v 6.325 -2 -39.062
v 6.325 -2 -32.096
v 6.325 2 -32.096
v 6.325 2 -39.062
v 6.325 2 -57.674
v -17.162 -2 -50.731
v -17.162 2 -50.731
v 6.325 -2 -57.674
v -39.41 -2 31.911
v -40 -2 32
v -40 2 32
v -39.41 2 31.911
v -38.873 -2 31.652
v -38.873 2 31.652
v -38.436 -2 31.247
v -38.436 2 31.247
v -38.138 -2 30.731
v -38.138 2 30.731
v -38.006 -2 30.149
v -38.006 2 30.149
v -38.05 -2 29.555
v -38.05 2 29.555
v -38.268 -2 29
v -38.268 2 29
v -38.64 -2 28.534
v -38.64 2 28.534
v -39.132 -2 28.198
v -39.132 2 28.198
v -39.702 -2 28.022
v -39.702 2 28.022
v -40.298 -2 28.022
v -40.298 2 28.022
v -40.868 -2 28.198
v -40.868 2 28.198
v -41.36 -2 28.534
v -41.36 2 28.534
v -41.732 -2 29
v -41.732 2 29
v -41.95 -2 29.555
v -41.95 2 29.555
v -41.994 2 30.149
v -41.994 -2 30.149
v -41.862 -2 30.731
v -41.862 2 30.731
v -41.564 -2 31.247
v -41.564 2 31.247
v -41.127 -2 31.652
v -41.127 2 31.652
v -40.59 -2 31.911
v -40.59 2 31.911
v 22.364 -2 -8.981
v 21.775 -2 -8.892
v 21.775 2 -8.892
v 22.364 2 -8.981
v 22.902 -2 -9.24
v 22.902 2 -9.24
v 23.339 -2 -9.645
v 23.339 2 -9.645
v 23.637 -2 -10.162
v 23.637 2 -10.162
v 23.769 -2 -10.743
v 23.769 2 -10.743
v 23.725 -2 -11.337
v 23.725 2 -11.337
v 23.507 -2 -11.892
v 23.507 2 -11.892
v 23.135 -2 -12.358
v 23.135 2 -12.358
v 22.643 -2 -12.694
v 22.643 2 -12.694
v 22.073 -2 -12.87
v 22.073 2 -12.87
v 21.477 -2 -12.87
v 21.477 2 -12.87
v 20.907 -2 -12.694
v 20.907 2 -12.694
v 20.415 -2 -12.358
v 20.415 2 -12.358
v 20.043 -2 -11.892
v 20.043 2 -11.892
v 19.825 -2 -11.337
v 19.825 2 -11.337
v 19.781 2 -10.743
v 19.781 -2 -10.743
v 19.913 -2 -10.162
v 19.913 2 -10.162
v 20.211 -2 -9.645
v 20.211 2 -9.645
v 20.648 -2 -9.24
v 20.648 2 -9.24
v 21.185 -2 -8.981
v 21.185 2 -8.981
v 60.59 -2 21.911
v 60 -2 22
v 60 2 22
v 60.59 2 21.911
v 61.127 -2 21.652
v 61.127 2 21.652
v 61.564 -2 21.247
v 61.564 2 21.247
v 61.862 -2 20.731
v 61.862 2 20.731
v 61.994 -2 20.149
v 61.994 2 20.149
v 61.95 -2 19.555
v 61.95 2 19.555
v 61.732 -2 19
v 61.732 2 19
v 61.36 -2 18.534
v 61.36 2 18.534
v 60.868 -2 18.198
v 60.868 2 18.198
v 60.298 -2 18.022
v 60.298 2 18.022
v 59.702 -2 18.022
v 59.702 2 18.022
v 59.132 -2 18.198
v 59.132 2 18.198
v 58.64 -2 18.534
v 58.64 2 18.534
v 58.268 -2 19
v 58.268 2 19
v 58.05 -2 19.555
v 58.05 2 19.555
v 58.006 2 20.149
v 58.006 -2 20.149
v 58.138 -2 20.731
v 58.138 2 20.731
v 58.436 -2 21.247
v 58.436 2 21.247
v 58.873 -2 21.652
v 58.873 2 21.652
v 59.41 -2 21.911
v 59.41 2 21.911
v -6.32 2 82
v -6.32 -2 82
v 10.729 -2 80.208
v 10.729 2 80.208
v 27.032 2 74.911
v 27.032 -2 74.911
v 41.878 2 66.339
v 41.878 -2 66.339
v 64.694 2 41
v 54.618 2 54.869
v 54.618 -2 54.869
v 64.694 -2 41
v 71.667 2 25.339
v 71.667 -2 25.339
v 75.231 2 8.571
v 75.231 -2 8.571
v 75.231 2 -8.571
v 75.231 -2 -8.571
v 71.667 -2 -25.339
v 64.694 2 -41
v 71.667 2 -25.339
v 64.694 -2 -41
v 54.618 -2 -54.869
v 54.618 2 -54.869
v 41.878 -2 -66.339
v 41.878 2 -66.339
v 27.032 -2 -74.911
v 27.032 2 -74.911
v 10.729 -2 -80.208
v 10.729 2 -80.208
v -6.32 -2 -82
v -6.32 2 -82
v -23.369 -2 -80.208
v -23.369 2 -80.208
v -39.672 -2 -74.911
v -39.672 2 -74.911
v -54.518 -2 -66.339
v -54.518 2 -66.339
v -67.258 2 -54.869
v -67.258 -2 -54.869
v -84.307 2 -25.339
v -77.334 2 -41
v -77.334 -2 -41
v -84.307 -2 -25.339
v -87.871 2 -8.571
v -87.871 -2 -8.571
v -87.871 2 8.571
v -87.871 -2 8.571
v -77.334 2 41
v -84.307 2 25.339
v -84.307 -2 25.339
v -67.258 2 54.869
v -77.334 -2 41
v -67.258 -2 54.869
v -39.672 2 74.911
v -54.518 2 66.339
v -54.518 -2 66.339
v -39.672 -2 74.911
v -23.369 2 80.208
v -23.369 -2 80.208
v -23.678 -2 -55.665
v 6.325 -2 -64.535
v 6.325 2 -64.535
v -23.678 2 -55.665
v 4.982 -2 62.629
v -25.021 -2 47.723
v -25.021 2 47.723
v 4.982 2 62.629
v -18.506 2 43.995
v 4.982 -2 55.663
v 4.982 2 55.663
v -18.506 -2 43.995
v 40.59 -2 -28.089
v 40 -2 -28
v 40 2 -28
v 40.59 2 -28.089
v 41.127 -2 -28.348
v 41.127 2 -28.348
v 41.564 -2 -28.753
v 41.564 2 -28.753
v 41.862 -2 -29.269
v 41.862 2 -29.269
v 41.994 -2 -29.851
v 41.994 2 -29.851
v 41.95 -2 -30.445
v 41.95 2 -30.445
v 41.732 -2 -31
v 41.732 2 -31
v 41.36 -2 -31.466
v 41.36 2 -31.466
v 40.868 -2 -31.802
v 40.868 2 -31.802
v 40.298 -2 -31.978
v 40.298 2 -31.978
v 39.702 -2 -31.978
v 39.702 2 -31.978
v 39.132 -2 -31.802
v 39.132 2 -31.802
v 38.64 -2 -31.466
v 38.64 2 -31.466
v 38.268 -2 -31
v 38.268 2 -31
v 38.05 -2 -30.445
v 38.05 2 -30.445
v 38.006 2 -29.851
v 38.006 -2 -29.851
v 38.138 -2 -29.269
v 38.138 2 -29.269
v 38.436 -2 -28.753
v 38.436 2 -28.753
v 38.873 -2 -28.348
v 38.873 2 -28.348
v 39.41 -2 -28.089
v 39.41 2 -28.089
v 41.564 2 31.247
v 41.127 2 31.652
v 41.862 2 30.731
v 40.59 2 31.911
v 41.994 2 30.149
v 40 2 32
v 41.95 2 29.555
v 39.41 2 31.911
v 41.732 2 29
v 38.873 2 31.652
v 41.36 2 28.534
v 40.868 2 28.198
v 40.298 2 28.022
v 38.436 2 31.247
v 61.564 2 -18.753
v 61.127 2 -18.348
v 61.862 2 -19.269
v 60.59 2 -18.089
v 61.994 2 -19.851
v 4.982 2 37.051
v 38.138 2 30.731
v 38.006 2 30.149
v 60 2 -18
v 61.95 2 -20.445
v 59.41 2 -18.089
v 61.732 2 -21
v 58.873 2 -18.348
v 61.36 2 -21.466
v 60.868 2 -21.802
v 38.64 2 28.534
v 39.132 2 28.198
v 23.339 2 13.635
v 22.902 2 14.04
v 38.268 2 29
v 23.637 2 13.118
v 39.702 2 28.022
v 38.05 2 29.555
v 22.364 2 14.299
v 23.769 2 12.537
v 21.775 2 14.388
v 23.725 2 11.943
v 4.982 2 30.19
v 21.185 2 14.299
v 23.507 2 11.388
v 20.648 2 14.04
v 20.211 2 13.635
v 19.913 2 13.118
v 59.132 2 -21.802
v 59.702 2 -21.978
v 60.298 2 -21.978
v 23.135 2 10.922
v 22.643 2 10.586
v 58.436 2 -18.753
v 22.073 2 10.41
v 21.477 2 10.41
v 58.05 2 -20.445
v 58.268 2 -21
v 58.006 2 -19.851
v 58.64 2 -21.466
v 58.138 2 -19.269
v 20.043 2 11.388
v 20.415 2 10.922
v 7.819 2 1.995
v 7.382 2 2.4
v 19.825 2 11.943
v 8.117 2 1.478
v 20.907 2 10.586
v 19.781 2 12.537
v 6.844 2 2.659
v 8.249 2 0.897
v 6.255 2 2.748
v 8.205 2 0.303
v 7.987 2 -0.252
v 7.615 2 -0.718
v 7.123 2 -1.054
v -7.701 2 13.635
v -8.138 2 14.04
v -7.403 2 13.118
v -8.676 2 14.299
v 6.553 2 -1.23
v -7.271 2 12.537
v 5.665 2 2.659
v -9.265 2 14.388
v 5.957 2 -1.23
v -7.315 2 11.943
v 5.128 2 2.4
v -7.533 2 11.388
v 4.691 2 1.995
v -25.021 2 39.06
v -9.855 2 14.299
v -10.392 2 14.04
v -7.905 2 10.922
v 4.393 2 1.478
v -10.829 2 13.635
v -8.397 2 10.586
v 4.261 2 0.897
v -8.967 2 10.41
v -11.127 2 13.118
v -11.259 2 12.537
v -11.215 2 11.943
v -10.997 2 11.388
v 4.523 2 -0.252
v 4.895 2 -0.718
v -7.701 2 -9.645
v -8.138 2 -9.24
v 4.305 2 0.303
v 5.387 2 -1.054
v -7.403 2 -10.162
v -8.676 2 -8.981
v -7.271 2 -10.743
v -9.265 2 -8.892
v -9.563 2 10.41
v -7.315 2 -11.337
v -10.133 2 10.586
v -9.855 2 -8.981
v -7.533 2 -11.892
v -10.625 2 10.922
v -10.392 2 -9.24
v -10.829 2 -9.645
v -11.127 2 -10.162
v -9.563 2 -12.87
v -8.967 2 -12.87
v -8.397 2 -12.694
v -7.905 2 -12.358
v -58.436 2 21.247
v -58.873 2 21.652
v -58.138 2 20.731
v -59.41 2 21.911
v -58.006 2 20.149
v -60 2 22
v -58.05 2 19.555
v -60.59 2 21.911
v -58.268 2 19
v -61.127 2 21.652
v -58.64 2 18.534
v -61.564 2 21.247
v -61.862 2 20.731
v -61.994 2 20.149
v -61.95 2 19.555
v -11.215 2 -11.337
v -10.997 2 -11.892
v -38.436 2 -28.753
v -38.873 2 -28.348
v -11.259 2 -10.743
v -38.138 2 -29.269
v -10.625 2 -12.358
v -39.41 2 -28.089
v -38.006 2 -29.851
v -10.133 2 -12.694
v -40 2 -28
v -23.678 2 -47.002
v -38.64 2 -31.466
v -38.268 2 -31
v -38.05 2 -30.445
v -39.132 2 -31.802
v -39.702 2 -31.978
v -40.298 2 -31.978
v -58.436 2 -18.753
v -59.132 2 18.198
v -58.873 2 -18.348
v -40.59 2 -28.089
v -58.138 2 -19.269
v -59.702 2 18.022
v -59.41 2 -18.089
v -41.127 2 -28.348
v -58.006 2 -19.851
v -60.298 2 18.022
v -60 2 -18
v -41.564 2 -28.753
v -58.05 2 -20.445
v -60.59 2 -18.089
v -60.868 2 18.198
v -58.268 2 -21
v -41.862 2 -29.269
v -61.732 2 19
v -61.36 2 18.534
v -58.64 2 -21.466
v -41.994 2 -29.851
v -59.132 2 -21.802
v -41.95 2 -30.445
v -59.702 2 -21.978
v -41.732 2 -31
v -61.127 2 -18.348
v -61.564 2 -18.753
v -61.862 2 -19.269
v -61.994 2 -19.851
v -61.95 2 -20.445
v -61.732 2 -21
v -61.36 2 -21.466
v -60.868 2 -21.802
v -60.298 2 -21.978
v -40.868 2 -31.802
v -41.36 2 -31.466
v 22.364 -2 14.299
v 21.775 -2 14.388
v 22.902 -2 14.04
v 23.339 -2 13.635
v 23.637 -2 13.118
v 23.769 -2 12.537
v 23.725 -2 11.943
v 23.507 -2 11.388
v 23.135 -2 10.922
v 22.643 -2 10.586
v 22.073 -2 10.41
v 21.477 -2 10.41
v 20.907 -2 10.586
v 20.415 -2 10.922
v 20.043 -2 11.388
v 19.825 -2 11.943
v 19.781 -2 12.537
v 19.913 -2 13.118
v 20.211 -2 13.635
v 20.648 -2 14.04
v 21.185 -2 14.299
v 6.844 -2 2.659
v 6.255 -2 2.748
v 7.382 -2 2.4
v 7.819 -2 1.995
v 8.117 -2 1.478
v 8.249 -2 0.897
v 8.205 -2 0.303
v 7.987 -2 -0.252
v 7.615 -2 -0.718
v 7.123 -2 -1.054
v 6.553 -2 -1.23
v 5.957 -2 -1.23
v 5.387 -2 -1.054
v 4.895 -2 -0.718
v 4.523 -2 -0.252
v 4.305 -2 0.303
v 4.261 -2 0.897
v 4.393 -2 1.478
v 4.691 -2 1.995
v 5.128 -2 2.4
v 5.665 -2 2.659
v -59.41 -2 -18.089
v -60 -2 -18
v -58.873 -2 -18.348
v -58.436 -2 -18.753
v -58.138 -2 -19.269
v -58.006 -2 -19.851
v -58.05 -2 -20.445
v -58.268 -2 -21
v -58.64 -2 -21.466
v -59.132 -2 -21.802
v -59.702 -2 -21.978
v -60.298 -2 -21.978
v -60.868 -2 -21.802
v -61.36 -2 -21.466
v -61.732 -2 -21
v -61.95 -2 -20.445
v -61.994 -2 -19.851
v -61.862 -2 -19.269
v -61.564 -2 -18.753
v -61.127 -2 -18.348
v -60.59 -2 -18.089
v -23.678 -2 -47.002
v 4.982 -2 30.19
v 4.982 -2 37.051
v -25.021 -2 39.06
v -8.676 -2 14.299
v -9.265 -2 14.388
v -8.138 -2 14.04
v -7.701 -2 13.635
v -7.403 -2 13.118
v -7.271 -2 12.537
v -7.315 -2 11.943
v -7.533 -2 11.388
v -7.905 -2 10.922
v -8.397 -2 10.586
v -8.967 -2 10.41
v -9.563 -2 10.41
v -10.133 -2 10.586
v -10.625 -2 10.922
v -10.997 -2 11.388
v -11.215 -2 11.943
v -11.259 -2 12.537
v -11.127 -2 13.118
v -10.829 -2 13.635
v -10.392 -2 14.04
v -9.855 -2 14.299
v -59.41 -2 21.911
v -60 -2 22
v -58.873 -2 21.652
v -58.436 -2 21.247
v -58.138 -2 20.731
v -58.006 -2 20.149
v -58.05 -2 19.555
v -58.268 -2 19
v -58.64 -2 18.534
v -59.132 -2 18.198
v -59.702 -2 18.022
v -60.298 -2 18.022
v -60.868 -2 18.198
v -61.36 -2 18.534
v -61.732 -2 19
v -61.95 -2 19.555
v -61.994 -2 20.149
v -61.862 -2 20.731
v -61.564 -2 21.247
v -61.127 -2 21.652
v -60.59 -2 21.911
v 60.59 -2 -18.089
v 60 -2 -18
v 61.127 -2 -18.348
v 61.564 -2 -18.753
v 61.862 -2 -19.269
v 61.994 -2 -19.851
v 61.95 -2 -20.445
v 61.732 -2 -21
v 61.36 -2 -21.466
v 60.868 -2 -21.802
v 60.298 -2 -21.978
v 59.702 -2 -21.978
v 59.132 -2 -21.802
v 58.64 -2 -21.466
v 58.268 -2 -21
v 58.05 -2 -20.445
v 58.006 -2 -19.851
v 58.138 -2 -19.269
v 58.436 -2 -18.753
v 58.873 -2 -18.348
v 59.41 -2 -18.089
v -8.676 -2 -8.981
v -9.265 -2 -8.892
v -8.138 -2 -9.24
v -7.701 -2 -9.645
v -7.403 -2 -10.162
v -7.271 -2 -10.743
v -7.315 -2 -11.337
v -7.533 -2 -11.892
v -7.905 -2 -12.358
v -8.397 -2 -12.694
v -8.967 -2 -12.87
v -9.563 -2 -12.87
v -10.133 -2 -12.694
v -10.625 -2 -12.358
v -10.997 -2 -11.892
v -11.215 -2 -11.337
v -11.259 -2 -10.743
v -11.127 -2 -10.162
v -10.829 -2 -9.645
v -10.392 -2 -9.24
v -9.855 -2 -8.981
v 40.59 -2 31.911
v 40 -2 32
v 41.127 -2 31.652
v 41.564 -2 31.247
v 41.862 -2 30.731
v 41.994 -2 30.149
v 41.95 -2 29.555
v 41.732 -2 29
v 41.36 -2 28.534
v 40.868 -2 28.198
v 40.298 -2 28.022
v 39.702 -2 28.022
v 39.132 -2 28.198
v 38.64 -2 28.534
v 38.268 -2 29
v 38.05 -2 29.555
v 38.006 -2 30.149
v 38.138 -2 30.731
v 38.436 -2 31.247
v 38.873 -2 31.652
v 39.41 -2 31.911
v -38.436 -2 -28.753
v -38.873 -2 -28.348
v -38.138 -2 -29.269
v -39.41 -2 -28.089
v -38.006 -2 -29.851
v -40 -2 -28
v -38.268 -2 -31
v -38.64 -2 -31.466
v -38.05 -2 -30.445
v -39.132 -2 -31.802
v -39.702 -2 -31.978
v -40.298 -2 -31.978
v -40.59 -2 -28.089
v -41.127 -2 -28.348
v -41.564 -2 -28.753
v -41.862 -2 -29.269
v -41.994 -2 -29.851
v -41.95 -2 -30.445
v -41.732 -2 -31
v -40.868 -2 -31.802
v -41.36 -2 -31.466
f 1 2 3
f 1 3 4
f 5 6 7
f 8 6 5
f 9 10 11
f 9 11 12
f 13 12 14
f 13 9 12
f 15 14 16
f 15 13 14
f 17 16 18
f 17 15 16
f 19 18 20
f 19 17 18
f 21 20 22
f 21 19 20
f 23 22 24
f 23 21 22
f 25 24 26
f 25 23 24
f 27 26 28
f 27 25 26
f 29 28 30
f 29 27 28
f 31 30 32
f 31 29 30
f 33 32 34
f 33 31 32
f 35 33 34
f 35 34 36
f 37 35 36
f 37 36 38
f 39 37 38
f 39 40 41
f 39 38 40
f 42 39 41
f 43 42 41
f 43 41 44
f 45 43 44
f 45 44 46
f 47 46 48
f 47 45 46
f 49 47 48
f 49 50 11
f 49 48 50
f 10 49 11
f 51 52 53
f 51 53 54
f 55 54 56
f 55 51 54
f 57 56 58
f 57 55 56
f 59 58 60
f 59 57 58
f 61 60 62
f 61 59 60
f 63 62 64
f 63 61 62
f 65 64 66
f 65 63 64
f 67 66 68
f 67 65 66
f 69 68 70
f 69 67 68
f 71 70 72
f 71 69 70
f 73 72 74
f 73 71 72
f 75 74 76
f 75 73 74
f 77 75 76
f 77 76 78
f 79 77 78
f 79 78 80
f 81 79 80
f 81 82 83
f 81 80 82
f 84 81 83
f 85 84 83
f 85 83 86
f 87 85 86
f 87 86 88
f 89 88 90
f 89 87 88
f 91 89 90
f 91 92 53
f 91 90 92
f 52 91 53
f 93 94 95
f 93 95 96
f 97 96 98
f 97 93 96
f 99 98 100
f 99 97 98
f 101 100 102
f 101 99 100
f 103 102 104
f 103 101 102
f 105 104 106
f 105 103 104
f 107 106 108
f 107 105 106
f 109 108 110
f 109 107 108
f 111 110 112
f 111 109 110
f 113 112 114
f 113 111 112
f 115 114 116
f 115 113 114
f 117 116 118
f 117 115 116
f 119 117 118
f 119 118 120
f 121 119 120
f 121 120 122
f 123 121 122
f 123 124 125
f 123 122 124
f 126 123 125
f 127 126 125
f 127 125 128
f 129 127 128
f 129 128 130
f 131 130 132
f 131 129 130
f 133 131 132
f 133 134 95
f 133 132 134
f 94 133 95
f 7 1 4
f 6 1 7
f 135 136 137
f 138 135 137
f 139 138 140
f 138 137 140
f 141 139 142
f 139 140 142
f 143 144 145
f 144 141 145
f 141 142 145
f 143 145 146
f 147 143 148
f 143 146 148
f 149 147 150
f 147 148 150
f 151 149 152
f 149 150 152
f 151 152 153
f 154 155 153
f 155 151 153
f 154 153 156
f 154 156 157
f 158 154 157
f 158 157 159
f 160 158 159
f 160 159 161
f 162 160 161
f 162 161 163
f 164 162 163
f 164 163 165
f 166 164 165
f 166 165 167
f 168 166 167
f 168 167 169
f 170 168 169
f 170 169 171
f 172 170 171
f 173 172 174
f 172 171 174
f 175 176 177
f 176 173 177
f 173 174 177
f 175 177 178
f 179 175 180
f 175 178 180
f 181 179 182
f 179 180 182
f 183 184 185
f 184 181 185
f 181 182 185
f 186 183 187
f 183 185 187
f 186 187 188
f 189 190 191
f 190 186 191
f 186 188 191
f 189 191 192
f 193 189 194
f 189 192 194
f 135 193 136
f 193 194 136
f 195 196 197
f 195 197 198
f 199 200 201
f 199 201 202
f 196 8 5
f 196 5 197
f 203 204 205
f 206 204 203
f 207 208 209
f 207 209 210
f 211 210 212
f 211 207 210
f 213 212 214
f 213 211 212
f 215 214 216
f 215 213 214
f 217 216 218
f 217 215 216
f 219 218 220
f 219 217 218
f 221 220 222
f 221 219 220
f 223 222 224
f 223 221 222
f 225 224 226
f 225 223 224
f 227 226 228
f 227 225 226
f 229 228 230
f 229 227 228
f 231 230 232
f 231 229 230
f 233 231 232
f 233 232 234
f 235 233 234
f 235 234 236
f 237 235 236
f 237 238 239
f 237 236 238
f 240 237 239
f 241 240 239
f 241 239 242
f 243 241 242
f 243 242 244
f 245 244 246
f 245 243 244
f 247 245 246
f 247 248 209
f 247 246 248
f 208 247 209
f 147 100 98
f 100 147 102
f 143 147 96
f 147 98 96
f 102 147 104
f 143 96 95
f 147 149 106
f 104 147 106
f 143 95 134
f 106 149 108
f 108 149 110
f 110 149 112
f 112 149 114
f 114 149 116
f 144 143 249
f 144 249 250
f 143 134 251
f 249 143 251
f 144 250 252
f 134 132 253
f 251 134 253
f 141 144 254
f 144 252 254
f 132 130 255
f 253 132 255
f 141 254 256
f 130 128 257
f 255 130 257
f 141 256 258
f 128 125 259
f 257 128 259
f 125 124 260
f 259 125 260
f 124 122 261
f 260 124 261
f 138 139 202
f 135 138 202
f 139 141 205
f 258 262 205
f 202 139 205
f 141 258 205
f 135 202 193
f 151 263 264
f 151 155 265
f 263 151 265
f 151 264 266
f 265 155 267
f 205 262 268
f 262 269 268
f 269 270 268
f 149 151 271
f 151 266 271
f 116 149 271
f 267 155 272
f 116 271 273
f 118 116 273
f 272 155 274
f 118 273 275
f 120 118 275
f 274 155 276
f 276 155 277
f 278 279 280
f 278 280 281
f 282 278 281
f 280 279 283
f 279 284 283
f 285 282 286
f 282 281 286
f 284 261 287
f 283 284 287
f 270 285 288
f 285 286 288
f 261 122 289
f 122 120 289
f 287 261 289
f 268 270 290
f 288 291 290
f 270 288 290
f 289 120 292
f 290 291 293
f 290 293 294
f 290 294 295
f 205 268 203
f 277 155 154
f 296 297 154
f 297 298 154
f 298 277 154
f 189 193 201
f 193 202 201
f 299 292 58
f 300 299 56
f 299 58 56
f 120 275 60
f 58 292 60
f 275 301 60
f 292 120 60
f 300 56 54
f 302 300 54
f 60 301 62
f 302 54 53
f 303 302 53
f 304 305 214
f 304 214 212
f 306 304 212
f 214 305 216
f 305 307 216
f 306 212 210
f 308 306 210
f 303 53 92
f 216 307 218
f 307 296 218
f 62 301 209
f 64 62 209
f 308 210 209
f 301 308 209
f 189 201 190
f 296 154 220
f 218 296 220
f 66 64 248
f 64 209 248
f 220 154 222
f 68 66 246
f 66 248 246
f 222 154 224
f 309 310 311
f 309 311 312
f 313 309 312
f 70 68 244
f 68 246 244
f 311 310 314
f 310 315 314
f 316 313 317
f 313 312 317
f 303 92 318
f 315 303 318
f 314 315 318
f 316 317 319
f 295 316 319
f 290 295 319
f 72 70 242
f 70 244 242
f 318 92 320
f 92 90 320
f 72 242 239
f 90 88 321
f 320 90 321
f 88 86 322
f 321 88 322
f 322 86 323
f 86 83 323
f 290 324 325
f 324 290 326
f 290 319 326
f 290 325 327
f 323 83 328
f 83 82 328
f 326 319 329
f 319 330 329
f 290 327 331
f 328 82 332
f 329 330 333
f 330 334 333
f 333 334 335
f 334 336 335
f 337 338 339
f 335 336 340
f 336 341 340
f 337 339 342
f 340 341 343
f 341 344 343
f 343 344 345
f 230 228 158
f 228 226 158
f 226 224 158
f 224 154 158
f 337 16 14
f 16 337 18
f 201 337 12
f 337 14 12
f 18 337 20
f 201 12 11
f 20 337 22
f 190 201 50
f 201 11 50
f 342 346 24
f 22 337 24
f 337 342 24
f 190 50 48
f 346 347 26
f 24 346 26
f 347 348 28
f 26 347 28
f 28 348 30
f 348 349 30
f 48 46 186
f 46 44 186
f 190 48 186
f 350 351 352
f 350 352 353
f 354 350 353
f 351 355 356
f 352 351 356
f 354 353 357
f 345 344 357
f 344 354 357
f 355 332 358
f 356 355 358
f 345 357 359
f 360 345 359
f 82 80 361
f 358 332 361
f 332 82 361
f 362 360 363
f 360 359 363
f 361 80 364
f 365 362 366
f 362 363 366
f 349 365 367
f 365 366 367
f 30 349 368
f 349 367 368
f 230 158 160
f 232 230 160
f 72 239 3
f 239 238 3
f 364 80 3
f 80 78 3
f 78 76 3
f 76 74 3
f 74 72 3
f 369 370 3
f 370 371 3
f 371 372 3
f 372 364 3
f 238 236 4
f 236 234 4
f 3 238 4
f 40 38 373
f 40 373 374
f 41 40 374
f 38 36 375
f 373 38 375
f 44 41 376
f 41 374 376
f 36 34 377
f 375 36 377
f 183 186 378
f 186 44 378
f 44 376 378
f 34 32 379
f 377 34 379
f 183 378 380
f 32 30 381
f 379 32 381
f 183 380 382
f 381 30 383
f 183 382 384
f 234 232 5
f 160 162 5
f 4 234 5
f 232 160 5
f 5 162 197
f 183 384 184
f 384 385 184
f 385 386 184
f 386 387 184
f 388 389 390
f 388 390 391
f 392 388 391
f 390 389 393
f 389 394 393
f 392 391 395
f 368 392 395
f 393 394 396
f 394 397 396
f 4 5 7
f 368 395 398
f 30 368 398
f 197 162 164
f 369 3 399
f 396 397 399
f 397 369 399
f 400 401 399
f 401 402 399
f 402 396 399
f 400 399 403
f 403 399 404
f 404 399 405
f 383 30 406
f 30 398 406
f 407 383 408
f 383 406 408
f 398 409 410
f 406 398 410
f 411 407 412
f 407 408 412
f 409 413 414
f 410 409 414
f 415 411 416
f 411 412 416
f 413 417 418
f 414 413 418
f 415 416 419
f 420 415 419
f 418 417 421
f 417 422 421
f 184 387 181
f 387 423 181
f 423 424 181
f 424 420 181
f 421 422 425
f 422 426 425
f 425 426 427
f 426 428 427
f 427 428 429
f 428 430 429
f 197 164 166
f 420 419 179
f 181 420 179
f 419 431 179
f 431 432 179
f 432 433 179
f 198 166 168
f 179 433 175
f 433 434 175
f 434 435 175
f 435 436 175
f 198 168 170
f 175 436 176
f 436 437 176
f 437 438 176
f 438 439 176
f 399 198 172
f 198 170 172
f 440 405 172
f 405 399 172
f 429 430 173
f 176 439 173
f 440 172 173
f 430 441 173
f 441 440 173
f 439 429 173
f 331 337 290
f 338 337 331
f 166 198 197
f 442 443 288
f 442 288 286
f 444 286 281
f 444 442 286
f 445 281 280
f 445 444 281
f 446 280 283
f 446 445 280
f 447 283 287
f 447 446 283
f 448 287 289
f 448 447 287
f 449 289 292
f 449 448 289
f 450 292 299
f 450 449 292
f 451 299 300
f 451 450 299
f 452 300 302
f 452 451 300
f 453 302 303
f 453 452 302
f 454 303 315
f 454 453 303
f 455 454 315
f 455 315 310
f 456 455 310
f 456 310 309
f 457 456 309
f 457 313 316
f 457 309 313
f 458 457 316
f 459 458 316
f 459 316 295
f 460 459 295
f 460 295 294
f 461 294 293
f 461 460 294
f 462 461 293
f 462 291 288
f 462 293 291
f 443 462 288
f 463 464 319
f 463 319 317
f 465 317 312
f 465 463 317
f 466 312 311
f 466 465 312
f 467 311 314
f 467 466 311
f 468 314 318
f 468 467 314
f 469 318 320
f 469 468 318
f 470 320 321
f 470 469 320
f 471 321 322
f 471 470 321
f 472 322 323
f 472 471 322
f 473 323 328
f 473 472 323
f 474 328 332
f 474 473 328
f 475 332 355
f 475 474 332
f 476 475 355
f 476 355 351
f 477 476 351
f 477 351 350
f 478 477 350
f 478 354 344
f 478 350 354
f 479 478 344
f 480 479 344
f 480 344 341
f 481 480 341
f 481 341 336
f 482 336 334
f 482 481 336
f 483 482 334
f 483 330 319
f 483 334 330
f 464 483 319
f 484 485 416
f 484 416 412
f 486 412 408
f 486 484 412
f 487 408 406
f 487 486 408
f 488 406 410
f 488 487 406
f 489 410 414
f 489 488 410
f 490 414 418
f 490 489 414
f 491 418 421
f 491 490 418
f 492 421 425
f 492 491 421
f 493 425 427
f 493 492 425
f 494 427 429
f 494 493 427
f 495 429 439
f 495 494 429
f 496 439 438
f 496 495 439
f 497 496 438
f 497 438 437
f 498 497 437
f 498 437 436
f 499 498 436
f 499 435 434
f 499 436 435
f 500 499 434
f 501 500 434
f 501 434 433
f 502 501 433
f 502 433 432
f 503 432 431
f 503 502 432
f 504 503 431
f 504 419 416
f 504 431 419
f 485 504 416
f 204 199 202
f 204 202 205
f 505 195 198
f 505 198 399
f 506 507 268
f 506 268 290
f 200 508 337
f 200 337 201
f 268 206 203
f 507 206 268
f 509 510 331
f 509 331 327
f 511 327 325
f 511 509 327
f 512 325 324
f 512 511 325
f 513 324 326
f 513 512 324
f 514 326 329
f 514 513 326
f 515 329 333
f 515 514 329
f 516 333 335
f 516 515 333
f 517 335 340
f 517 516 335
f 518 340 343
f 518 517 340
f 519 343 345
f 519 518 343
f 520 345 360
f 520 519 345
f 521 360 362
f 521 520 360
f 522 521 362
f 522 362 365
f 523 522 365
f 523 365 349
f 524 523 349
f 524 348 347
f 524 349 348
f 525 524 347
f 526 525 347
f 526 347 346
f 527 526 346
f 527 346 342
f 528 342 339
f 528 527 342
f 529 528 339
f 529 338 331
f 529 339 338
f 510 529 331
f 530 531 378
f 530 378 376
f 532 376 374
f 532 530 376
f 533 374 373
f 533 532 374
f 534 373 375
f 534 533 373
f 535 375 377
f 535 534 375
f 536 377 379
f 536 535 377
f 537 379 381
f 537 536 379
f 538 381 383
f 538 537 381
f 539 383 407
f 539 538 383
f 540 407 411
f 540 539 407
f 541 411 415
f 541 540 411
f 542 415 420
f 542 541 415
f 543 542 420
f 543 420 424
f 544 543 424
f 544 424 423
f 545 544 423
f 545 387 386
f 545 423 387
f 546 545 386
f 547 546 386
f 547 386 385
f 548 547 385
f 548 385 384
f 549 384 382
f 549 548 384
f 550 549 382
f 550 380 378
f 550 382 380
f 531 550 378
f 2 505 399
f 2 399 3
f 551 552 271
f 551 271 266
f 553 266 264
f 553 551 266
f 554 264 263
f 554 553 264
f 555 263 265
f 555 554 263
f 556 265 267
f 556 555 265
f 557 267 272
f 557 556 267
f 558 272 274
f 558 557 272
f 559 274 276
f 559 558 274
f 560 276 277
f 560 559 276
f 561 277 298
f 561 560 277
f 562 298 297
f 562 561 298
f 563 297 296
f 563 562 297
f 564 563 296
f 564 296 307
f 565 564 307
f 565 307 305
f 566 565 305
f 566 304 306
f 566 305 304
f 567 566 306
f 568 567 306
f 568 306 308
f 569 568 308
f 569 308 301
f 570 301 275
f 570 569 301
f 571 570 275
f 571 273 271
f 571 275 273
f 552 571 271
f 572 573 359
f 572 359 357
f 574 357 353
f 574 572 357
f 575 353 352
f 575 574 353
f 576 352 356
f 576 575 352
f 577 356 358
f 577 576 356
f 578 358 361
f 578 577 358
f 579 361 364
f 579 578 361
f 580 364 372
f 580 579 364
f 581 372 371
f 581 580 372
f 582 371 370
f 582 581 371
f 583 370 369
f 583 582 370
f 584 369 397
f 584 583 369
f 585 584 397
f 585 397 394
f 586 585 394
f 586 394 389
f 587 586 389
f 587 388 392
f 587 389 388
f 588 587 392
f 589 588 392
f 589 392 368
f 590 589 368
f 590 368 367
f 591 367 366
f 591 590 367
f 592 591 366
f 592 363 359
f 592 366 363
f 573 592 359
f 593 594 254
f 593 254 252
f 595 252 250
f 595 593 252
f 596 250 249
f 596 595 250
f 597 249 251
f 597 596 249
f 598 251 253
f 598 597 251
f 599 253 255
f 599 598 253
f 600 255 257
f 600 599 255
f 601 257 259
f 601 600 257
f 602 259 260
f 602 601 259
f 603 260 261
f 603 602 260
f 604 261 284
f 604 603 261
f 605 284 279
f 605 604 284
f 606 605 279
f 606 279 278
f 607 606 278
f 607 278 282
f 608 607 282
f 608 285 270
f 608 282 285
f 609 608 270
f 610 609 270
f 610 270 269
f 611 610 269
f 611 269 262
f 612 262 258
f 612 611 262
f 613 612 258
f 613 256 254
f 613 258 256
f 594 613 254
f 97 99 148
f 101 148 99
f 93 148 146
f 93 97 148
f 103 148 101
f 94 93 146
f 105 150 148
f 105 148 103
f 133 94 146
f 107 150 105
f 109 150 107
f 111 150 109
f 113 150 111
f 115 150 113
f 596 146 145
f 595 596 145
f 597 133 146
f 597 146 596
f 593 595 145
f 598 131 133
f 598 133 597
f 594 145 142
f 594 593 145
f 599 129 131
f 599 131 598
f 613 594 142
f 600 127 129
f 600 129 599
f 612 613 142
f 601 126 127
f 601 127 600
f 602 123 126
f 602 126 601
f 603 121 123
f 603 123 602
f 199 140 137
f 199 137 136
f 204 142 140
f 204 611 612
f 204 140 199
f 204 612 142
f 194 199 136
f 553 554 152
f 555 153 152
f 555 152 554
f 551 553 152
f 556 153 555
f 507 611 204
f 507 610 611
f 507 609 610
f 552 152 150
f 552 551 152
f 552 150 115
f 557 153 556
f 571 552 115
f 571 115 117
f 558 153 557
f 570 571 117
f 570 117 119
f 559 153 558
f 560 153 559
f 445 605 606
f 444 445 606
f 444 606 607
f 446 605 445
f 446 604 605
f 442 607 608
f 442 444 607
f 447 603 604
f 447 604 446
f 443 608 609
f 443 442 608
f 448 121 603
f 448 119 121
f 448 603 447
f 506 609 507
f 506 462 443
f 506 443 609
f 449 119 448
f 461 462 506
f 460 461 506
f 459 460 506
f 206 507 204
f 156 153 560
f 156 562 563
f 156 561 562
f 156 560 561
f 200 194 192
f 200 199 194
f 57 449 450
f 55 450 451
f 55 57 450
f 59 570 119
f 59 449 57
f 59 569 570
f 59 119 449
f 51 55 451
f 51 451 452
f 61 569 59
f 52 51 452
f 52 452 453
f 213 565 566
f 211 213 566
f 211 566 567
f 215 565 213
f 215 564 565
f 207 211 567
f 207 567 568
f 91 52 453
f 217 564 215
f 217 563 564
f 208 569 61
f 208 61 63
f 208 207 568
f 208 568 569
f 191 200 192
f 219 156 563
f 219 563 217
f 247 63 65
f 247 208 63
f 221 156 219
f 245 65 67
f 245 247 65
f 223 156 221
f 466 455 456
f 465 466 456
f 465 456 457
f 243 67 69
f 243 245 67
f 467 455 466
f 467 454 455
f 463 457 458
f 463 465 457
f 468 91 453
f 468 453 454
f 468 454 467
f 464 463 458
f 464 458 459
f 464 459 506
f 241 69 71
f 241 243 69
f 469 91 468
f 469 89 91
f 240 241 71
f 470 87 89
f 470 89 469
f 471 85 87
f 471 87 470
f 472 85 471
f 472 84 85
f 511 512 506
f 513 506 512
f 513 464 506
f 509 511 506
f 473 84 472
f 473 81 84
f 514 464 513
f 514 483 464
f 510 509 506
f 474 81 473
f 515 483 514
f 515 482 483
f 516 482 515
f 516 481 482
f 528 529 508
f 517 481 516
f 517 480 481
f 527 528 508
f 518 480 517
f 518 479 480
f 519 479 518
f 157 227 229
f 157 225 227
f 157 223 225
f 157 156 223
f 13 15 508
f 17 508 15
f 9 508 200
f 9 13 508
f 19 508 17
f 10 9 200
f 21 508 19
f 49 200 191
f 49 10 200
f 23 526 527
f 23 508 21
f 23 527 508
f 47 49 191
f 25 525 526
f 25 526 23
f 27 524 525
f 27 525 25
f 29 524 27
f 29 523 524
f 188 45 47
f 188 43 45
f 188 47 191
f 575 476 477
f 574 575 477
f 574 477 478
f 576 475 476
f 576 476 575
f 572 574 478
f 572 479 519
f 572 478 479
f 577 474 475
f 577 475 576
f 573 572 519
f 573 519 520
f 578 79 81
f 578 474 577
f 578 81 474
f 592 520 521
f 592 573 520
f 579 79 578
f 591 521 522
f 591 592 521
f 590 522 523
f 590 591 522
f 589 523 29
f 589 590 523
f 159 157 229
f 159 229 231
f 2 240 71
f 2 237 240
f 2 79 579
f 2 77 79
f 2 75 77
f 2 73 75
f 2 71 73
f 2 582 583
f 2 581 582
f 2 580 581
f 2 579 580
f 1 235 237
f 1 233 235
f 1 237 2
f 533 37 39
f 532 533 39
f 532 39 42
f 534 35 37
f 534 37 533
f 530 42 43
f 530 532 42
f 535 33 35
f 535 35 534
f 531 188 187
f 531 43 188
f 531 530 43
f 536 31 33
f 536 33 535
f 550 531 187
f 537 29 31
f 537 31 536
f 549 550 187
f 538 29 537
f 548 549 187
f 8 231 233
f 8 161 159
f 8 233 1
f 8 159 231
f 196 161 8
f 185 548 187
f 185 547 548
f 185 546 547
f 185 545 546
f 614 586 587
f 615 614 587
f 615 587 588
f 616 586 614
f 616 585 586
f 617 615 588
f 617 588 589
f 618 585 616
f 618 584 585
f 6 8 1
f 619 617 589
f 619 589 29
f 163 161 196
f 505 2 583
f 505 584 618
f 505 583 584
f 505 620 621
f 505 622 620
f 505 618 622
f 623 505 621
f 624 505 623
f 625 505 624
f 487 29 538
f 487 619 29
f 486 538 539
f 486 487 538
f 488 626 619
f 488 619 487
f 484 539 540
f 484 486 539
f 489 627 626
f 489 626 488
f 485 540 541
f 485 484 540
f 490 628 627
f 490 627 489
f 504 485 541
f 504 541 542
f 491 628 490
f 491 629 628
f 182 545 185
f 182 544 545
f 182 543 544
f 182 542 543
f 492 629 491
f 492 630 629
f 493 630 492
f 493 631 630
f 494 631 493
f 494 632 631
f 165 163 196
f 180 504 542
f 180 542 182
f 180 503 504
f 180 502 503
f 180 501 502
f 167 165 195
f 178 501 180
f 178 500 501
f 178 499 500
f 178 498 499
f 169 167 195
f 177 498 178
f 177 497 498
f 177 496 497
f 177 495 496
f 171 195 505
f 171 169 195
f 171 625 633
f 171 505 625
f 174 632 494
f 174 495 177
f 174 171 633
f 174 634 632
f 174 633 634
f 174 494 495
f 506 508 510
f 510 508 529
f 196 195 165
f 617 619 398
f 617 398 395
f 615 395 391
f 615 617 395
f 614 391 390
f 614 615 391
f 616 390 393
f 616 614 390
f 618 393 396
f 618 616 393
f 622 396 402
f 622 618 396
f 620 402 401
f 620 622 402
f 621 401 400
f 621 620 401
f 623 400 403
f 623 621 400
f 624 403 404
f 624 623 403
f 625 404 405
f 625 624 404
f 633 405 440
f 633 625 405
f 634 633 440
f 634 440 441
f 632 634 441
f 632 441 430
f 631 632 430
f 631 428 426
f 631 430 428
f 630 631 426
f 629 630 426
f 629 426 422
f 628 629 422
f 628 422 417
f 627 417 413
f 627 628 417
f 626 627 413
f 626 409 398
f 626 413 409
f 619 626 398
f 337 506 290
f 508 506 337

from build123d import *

# Parameters (mm, degrees)
EXTRUDE_2426_DEPTH          = 2
CUT_EXTRUDE_2700_DEPTH      = 184.109257002
CUT_EXTRUDE_2700_DEPTH_BACK = 184.109257002
SKETCH_5_R                  = 92
SKETCH_5_R_2                = 82
VV_DEPTH                    = 121.533854246
VV_DEPTH_BACK               = 121.533854246
CUT_EXTRUDE_7_DEPTH         = 121.533854246
CUT_EXTRUDE_7_DEPTH_BACK    = 121.533854246
SKETCH_10_R                 = 2
CUT_EXTRUDE_8_DEPTH         = 121.533854246
CUT_EXTRUDE_8_DEPTH_BACK    = 121.533854246
SKETCH_17_R                 = 2
CUT_EXTRUDE_9_DEPTH         = 121.533854246
CUT_EXTRUDE_9_DEPTH_BACK    = 121.533854246
SKETCH_6_R                  = 2


with BuildPart() as part:
    # 草图1 → Extrude 2426 (new, symmetric)
    with BuildSketch(Plane(origin=(0, 0, 0), x_dir=(1, 0, 0), z_dir=(0, 1, 0))):
        Polygon((-150, -85), (-150, 85), (-110, 85), (-69, 85), (-62, 85), (-25, 105), (-2, 105), (30, 105), (56.423376881, 85), (67.423376881, 85), (108.643784617, 85), (108.643784617, 70), (123.423376881, 70), (138, 40), (150, 40), (150, -40), (138, -40), (123.423376881, -70), (108.643784617, -70), (108.643784617, -85), (67.423376881, -85), (56.423376881, -85), (30, -105), (-2, -105), (-25, -105), (-62, -85), (-69, -85), (-110, -85), align=None)
    extrude(amount=EXTRUDE_2426_DEPTH, both=True)

    # 草图5 → Cut-Extrude 2700 (cut, two sides: drawn at the far end of the back side and taken through both)
    with BuildSketch(Plane(origin=(0, 0, 0), x_dir=(1, 0, 0), z_dir=(0, 1, 0)).offset(-CUT_EXTRUDE_2700_DEPTH_BACK)):
        with Locations((-6.31992991, 0)):
            Circle(SKETCH_5_R)
        with Locations(Location((-6.31992991, 0, 0), (0, 0, 270))):
            Circle(SKETCH_5_R_2, mode=Mode.SUBTRACT)
    extrude(amount=CUT_EXTRUDE_2700_DEPTH + CUT_EXTRUDE_2700_DEPTH_BACK, mode=Mode.SUBTRACT)


with BuildPart() as body_2:
    # of the pieces the cut leaves, the one that is kept (cut_extrude_2700_keep)
    add(part.part.solids().sort_by_distance((-6.31992991, -2, 82))[0])

    # 草图11 → vv (cut, two sides: drawn at the far end of the back side and taken through both)
    with BuildSketch(Plane(origin=(0, 0, 0), x_dir=(1, 0, 0), z_dir=(0, 1, 0)).offset(-VV_DEPTH_BACK)):
        Polygon((6.325153319, 64.535132696), (-23.677770795, 55.665092595), (-23.677770795, 47.002272942), (6.325153319, 32.096278657), (6.325153319, 39.061910109), (-17.161984245, 50.730744019), (6.325153319, 57.674462279), align=None)
        Polygon((4.981591187, -30.190121431), (-25.021332927, -39.060161532), (-25.021332927, -47.722981185), (4.981591187, -62.62897547), (4.981591187, -55.663344018), (-18.505546377, -43.994510108), (4.981591187, -37.050791848), align=None)
    extrude(amount=VV_DEPTH + VV_DEPTH_BACK, mode=Mode.SUBTRACT)

    # 草图10 → 切除-拉伸7 (cut, two sides: drawn at the far end of the back side and taken through both)
    with BuildSketch(Plane(origin=(0, 0, 0), x_dir=(1, 0, 0), z_dir=(0, 1, 0)).offset(-CUT_EXTRUDE_7_DEPTH_BACK)):
        with Locations((-130, 65)):
            Circle(SKETCH_10_R)
        with Locations((-130, -65)):
            Circle(SKETCH_10_R)
        with Locations((115, 55)):
            Circle(SKETCH_10_R)
        with Locations((115, -55)):
            Circle(SKETCH_10_R)
        with Locations(Location((-60, 20, 0), (0, 0, 270))):
            Circle(SKETCH_10_R)
        with Locations(Location((-60, -20, 0), (0, 0, 270))):
            Circle(SKETCH_10_R)
        with Locations(Location((60, 20, 0), (0, 0, 270))):
            Circle(SKETCH_10_R)
        with Locations(Location((60, -20, 0), (0, 0, 270))):
            Circle(SKETCH_10_R)
    extrude(amount=CUT_EXTRUDE_7_DEPTH + CUT_EXTRUDE_7_DEPTH_BACK, mode=Mode.SUBTRACT)

    # 草图17 → 切除-拉伸8 (cut, two sides: drawn at the far end of the back side and taken through both)
    with BuildSketch(Plane(origin=(0, 0, 0), x_dir=(1, 0, 0), z_dir=(0, 1, 0)).offset(-CUT_EXTRUDE_8_DEPTH_BACK)):
        with Locations(Location((-40, 30, 0), (0, 0, 270))):
            Circle(SKETCH_17_R)
        with Locations(Location((40, 30, 0), (0, 0, 270))):
            Circle(SKETCH_17_R)
        with Locations(Location((-40, -30, 0), (0, 0, 270))):
            Circle(SKETCH_17_R)
        with Locations(Location((40, -30, 0), (0, 0, 270))):
            Circle(SKETCH_17_R)
    extrude(amount=CUT_EXTRUDE_8_DEPTH + CUT_EXTRUDE_8_DEPTH_BACK, mode=Mode.SUBTRACT)

    # 草图6 → 切除-拉伸9 (cut, two sides: drawn at the far end of the back side and taken through both)
    with BuildSketch(Plane(origin=(0, 0, 0), x_dir=(1, 0, 0), z_dir=(0, 1, 0)).offset(-CUT_EXTRUDE_9_DEPTH_BACK)):
        with Locations(Location((21.774981178, -12.387805022, 0), (0, 0, 270))):
            Circle(SKETCH_6_R)
        with Locations(Location((-9.265018822, 10.892194978, 0), (0, 0, 270))):
            Circle(SKETCH_6_R)
        with Locations(Location((-9.265018822, -12.387805022, 0), (0, 0, 270))):
            Circle(SKETCH_6_R)
        with Locations(Location((6.254981178, -0.747805022, 0), (0, 0, 270))):
            Circle(SKETCH_6_R)
        with Locations(Location((21.774981178, 10.892194978, 0), (0, 0, 270))):
            Circle(SKETCH_6_R)
    extrude(amount=CUT_EXTRUDE_9_DEPTH + CUT_EXTRUDE_9_DEPTH_BACK, mode=Mode.SUBTRACT)


solid = body_2.part
